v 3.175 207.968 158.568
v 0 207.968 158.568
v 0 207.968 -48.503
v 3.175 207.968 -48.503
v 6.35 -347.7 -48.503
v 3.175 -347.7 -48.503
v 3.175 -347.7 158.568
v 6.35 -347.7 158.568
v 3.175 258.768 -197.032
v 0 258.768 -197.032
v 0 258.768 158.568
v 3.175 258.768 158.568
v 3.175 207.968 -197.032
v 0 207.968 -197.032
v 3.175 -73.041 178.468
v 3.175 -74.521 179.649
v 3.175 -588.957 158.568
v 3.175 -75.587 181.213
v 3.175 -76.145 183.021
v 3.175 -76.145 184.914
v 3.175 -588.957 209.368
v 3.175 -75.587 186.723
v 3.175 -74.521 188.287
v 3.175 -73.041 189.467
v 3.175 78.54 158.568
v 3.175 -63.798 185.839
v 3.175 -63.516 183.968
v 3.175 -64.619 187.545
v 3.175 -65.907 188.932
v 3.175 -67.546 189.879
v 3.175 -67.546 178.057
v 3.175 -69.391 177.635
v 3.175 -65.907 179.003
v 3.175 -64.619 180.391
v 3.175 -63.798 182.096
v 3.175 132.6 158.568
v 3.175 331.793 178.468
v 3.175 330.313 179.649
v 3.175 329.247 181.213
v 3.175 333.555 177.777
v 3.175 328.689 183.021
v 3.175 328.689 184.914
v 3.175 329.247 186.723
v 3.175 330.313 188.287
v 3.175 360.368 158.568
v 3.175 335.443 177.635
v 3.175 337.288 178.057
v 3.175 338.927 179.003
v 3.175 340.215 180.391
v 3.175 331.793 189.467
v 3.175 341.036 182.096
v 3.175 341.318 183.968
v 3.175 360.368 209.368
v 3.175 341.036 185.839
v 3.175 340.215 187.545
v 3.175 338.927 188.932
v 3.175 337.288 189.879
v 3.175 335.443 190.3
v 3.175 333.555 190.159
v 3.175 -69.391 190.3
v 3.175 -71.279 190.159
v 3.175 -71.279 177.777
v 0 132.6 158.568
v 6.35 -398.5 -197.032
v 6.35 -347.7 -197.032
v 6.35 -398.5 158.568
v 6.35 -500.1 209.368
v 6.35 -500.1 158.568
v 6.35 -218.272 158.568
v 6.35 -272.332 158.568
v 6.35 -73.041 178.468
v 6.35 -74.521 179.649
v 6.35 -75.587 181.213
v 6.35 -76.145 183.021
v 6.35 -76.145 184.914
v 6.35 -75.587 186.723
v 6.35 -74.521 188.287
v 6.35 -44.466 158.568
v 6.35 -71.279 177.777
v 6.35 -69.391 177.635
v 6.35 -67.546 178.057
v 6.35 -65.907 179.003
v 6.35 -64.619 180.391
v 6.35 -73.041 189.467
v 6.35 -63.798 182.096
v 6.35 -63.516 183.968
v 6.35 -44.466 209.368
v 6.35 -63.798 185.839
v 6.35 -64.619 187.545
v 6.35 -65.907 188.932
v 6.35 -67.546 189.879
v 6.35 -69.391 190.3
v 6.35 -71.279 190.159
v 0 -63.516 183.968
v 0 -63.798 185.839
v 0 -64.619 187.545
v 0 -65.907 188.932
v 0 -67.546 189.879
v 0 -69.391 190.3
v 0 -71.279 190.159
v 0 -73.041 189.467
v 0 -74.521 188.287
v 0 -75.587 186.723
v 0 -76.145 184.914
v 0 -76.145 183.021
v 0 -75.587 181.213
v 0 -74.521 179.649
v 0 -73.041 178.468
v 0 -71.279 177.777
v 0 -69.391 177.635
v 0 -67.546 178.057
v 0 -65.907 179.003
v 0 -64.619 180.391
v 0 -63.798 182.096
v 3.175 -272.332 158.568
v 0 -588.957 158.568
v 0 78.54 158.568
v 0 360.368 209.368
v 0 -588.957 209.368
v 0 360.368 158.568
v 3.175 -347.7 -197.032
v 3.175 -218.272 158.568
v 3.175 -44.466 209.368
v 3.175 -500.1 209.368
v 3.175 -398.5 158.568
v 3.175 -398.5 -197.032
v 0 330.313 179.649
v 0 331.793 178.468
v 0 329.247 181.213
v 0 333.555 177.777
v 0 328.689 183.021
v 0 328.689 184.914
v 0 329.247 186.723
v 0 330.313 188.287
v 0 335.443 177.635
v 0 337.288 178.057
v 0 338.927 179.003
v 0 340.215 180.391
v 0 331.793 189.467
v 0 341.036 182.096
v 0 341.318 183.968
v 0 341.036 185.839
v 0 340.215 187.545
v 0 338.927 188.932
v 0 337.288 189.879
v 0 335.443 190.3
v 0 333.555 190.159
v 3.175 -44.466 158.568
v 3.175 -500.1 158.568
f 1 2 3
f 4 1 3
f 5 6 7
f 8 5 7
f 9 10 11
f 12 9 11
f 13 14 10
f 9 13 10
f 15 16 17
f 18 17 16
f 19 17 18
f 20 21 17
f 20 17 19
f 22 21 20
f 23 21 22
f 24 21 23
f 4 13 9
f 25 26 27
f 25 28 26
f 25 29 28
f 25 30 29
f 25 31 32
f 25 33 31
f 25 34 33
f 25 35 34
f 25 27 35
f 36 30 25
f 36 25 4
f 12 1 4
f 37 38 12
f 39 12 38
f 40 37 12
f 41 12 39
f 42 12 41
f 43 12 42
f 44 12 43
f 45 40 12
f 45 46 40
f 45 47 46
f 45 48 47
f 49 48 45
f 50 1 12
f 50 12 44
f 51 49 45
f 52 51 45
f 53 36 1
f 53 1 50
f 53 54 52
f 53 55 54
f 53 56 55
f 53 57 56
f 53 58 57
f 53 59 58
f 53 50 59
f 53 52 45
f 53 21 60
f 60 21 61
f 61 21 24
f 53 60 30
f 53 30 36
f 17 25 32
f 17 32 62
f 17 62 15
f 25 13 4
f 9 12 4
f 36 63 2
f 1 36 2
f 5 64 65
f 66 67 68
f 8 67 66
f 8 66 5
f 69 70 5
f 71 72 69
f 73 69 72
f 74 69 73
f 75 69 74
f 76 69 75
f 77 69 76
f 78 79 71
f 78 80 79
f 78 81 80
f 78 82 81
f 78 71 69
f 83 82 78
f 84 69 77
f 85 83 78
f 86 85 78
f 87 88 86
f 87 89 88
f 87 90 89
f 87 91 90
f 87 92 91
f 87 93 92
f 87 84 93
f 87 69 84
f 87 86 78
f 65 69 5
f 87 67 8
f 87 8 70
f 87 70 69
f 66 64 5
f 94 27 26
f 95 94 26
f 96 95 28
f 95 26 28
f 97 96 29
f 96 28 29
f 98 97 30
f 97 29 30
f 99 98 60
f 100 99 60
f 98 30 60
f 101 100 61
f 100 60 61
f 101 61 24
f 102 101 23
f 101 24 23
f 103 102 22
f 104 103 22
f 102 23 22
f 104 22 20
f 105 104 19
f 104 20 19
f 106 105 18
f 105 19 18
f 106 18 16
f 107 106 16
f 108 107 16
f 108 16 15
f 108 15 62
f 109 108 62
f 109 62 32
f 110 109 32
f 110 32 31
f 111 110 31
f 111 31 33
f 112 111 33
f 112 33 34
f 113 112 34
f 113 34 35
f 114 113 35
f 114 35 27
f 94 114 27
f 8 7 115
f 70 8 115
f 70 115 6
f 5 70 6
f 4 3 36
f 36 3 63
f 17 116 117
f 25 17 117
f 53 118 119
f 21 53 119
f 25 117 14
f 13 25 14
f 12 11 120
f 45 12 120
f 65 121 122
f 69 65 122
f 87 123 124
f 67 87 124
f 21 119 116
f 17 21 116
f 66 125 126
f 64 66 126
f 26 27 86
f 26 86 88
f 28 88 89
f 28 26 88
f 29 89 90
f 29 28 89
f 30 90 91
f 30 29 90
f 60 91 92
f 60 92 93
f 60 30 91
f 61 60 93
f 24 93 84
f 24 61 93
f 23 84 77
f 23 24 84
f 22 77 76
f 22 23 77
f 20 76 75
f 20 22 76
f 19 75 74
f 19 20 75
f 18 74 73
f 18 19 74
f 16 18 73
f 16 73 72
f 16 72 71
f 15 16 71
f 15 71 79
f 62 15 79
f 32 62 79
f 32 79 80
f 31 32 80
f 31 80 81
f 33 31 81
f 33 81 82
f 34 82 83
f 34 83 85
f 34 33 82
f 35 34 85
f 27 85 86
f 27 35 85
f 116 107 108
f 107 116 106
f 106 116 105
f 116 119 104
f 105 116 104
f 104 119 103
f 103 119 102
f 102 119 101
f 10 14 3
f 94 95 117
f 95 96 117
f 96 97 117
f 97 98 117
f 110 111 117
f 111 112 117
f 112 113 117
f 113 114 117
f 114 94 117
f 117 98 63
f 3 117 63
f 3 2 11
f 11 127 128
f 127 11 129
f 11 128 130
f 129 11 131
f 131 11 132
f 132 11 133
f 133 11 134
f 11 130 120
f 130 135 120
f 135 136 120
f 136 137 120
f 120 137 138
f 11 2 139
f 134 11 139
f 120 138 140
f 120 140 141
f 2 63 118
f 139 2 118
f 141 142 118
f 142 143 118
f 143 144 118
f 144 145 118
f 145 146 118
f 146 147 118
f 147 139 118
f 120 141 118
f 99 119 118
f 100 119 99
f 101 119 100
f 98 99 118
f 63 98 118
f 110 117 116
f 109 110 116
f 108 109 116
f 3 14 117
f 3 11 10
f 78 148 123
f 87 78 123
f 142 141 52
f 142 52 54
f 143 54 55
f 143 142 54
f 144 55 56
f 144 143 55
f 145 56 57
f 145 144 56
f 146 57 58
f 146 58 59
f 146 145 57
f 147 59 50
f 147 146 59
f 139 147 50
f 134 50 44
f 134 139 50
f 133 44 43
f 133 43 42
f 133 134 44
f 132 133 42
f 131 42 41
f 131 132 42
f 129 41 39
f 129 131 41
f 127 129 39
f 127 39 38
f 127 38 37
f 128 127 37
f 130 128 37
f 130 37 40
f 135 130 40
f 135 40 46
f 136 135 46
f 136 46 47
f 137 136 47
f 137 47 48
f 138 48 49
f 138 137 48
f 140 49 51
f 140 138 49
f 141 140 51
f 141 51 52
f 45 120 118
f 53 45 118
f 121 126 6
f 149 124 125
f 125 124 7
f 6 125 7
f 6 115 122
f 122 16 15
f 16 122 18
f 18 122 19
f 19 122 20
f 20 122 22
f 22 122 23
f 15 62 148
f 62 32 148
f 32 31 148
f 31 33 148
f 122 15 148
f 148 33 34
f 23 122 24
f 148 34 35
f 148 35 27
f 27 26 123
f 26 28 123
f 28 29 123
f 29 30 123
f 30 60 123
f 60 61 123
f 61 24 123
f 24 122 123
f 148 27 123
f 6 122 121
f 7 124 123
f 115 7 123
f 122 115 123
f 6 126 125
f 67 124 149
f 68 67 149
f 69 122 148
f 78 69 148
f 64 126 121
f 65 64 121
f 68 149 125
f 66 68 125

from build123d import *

# Parameters (mm, degrees)
F0_R     = 6.35
F1_DEPTH = 3.175
F2_R     = 6.35
F3_DEPTH = 3.175
F4_R     = 6.35
F5_DEPTH = 25.4


with BuildPart() as f1:
    # F0 (on Right) → F1 (new body)
    with BuildSketch(Plane.YZ):
        Polygon((360.368041, 209.367727), (-588.956959, 209.367727), (-588.956959, 158.567727), (78.540226, 158.567727), (207.968041, -197.032273), (258.768041, -197.032273), (258.768041, 158.567727), (360.368041, 158.567727), align=None)
        Polygon((132.600457, 158.567727), (207.968041, 158.567727), (207.968041, -48.50301), align=None, mode=Mode.SUBTRACT)
        with Locations((334.968041, 183.967727)):
            Circle(F0_R, mode=Mode.SUBTRACT)
    extrude(amount=F1_DEPTH)

    # F4 (on face) → F5 (cut)
    with BuildSketch(Plane.YZ.offset(3.175)):
        with Locations((-69.865868, 183.967727)):
            Circle(F4_R)
    extrude(amount=-F5_DEPTH, mode=Mode.SUBTRACT)


with BuildPart() as f3:
    # F2 (on face) → F3 (new body)
    with BuildSketch(Plane.YZ.offset(3.175)):
        Polygon((-398.499778, -197.032273), (-347.699778, -197.032273), (-218.271963, 158.567727), (-44.465868, 158.567727), (-44.465868, 209.367727), (-500.099778, 209.367727), (-500.099778, 158.567727), (-398.499778, 158.567727), align=None)
        Polygon((-272.332194, 158.567727), (-347.699778, -48.50301), (-347.699778, 158.567727), align=None, mode=Mode.SUBTRACT)
        with Locations((-69.865868, 183.967727)):
            Circle(F2_R, mode=Mode.SUBTRACT)
    extrude(amount=F3_DEPTH)


solid = Compound([f1.part, f3.part])
